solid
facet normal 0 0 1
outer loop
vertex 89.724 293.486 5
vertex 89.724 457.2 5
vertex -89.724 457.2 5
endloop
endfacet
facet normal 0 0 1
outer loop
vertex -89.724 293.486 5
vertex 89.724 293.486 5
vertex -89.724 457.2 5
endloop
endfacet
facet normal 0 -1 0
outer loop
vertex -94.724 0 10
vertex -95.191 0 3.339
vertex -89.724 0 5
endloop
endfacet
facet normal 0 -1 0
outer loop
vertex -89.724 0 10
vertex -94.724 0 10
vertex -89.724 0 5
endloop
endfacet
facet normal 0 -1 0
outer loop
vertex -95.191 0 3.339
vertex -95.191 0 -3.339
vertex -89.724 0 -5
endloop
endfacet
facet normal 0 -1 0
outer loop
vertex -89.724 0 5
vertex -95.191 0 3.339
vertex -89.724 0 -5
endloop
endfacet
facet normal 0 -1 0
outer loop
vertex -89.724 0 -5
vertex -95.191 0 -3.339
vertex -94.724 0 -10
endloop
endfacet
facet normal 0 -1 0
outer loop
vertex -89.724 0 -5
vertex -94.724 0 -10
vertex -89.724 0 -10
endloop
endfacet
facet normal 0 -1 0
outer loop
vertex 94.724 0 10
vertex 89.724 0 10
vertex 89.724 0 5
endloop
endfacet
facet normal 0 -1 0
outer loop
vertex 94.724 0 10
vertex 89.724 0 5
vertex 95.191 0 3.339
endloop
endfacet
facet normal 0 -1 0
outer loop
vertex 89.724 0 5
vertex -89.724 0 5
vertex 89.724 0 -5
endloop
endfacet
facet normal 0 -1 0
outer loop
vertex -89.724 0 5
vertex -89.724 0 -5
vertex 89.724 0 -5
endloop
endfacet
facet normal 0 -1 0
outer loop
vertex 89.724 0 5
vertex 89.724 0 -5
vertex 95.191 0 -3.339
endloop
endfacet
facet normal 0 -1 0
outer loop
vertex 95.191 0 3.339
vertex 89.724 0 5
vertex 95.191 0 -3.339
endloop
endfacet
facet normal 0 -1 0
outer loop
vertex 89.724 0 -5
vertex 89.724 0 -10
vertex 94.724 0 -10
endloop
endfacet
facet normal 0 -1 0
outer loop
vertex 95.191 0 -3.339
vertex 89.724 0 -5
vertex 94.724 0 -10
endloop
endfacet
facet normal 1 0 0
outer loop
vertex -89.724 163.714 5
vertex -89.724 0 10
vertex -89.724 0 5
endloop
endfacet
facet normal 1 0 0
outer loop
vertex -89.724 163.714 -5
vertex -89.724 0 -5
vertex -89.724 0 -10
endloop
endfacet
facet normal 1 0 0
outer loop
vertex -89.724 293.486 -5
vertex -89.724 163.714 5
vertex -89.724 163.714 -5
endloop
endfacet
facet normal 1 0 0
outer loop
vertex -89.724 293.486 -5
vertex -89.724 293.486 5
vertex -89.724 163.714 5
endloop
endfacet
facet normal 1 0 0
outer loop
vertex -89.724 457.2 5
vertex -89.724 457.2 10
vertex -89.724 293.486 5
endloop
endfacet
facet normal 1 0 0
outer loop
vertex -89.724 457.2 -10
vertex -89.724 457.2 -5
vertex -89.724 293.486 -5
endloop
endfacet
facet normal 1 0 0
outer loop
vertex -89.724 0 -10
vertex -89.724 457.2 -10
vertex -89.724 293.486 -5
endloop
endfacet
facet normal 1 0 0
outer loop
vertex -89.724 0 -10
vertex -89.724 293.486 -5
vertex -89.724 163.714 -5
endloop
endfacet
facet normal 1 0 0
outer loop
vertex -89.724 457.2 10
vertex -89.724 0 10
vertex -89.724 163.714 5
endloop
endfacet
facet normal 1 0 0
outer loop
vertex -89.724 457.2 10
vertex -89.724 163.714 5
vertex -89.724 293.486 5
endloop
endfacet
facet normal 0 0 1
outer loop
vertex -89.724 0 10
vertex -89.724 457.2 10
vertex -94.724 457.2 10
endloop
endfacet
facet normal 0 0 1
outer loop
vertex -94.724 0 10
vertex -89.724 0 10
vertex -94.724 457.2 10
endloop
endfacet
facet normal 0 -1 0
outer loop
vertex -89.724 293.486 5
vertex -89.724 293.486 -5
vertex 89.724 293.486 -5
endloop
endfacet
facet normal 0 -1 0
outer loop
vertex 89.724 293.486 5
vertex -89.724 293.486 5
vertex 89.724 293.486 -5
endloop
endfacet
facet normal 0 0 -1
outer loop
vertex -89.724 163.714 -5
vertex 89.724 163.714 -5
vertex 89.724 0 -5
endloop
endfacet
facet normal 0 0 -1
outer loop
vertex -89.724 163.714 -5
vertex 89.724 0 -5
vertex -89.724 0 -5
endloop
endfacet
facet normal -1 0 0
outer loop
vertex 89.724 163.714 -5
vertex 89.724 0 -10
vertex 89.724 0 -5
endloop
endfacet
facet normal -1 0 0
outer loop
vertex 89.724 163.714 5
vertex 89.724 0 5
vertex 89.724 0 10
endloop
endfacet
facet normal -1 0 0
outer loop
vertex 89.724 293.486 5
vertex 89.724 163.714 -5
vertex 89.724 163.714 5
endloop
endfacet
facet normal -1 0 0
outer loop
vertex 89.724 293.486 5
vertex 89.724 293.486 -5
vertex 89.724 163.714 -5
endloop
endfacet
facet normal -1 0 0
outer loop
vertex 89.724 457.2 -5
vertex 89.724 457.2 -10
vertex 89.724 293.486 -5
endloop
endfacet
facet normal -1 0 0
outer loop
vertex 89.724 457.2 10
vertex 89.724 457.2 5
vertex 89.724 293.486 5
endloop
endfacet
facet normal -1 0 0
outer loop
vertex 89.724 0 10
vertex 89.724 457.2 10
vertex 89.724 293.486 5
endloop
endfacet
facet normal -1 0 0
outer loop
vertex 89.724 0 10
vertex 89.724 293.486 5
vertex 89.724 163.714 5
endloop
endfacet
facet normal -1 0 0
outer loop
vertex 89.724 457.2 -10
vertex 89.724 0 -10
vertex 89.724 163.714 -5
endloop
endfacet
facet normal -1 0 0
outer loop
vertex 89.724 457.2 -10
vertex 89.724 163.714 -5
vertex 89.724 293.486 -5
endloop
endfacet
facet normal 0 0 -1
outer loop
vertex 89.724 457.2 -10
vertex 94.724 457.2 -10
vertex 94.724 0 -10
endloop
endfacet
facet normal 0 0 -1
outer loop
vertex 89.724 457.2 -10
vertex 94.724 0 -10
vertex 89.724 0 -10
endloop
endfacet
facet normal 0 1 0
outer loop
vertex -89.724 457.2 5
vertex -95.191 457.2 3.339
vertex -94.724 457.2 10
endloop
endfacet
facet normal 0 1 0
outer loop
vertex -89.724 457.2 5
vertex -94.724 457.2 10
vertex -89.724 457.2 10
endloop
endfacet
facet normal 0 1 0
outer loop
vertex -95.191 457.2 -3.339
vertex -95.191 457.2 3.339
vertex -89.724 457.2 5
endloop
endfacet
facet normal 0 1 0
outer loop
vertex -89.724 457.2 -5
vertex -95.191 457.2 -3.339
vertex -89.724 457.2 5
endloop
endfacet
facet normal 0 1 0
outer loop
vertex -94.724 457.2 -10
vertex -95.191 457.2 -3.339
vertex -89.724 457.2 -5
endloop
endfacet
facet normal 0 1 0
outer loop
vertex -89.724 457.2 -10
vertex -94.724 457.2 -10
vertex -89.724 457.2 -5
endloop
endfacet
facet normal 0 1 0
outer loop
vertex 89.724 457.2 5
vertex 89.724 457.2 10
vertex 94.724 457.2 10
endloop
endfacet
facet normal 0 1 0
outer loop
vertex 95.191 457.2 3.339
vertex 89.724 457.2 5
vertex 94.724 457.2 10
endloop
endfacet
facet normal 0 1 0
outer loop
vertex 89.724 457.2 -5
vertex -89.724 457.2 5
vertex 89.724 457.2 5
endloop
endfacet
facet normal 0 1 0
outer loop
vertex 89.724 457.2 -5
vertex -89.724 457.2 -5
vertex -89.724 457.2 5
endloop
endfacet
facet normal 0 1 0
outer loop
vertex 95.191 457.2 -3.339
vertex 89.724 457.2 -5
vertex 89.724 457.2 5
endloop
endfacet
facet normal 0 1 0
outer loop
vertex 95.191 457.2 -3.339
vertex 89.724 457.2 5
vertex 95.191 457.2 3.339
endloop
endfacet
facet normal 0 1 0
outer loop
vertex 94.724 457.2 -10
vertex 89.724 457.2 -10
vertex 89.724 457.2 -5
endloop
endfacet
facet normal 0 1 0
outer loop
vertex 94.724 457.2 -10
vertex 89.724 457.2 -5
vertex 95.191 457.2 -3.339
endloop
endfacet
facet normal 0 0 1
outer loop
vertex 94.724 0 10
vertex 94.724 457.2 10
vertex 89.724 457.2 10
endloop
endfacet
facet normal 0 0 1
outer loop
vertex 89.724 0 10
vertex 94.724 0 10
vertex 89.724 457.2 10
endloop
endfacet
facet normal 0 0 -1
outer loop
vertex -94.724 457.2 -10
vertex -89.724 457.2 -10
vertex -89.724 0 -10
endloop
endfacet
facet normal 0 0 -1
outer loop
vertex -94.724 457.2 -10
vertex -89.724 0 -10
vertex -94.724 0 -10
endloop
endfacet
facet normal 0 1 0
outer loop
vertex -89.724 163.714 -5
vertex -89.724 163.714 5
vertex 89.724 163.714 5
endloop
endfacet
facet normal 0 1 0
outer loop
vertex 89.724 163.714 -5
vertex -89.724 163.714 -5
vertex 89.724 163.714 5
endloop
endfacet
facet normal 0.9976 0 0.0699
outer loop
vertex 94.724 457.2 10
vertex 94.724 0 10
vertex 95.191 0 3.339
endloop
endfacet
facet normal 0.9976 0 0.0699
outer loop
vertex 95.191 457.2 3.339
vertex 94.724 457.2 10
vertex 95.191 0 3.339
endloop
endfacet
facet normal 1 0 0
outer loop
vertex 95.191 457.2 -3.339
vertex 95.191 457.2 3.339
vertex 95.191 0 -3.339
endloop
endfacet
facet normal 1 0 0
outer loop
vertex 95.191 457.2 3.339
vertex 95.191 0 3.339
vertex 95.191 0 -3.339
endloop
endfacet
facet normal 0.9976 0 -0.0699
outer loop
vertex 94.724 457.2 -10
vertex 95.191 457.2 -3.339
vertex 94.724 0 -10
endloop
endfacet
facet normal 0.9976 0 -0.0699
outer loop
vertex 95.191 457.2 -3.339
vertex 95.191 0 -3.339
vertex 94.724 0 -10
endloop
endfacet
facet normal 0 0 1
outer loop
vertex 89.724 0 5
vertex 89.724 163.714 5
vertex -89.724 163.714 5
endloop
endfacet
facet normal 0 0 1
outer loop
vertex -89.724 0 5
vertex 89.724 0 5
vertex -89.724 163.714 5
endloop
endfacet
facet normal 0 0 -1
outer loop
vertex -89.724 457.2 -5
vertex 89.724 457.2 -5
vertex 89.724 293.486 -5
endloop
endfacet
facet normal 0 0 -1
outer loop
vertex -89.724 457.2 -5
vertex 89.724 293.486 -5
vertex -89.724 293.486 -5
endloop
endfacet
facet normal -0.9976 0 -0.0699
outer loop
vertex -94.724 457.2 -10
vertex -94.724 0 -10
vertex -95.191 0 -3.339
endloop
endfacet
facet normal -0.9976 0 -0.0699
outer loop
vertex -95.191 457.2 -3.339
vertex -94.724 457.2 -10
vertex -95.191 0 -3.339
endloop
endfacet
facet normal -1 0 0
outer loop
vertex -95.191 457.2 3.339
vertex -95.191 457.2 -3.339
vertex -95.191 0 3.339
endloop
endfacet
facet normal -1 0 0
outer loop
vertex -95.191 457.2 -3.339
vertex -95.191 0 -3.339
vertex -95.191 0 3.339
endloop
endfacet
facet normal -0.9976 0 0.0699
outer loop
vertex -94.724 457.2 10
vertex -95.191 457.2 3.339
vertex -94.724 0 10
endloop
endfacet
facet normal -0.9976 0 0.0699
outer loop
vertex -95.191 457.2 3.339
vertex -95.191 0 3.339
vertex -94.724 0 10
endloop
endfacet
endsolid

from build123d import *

# Parameters (mm, degrees)
SKETCH1_R               = 95.25
BOSS_EXTRUDE1_DEPTH     = 457.2
CUT_EXTRUDE1_DEPTH      = 457.2
CUT_EXTRUDE2_DEPTH      = 457.2
SKETCH9_W               = 179.447222202
SKETCH9_H               = 129.77242504
CUT_EXTRUDE4_DEPTH      = 11
CUT_EXTRUDE4_DEPTH_BACK = 11


with BuildPart() as part:
    # Sketch1 → Boss-Extrude1 (new body)
    with BuildSketch(Plane(origin=(0, 0, 0), x_dir=(1, 0, 0), z_dir=(0, 1, 0))):
        Circle(SKETCH1_R)
    extrude(amount=BOSS_EXTRUDE1_DEPTH)

    # Sketch2 → Cut-Extrude1 (cut)
    with BuildSketch(Plane(origin=(0, 457.2, 0), x_dir=(1, 0, 0), z_dir=(0, 1, 0))):
        with BuildLine():
            Line((89.723611101, 10), (89.723611101, 5))
            Line((89.723611101, 5), (-89.723611101, 5))
            Line((-89.723611101, 5), (-89.723611101, 10))
            Line((-89.723611101, 10), (-94.723611101, 10))
            ThreePointArc((-94.723611101, 10), (0, 95.25), (94.723611101, 10))
            Line((94.723611101, 10), (89.723611101, 10))
        make_face()
    extrude(amount=-CUT_EXTRUDE1_DEPTH, mode=Mode.SUBTRACT)

    # Sketch5 → Cut-Extrude2 (cut)
    with BuildSketch(Plane(origin=(0, 457.2, 0), x_dir=(1, 0, 0), z_dir=(0, 1, 0))):
        with BuildLine():
            Line((0, -5), (-89.723611101, -5))
            Line((-89.723611101, -5), (-89.723611101, -10))
            Line((-89.723611101, -10), (-94.723611101, -10))
            ThreePointArc((-94.723611101, -10), (0, -95.25), (94.723611101, -10))
            Line((94.723611101, -10), (89.723611101, -10))
            Line((89.723611101, -10), (89.723611101, -5))
            Line((89.723611101, -5), (0, -5))
        make_face()
    extrude(amount=-CUT_EXTRUDE2_DEPTH, mode=Mode.SUBTRACT)

    # Sketch9 → Cut-Extrude4 (cut, two sides)
    with BuildSketch(Plane.XY) as cut_extrude4_sk:
        with Locations((0, 228.6)):
            Rectangle(SKETCH9_W, SKETCH9_H)
    extrude(amount=CUT_EXTRUDE4_DEPTH, mode=Mode.SUBTRACT)
    extrude(cut_extrude4_sk.sketch, amount=-CUT_EXTRUDE4_DEPTH_BACK, mode=Mode.SUBTRACT)


solid = part.part
